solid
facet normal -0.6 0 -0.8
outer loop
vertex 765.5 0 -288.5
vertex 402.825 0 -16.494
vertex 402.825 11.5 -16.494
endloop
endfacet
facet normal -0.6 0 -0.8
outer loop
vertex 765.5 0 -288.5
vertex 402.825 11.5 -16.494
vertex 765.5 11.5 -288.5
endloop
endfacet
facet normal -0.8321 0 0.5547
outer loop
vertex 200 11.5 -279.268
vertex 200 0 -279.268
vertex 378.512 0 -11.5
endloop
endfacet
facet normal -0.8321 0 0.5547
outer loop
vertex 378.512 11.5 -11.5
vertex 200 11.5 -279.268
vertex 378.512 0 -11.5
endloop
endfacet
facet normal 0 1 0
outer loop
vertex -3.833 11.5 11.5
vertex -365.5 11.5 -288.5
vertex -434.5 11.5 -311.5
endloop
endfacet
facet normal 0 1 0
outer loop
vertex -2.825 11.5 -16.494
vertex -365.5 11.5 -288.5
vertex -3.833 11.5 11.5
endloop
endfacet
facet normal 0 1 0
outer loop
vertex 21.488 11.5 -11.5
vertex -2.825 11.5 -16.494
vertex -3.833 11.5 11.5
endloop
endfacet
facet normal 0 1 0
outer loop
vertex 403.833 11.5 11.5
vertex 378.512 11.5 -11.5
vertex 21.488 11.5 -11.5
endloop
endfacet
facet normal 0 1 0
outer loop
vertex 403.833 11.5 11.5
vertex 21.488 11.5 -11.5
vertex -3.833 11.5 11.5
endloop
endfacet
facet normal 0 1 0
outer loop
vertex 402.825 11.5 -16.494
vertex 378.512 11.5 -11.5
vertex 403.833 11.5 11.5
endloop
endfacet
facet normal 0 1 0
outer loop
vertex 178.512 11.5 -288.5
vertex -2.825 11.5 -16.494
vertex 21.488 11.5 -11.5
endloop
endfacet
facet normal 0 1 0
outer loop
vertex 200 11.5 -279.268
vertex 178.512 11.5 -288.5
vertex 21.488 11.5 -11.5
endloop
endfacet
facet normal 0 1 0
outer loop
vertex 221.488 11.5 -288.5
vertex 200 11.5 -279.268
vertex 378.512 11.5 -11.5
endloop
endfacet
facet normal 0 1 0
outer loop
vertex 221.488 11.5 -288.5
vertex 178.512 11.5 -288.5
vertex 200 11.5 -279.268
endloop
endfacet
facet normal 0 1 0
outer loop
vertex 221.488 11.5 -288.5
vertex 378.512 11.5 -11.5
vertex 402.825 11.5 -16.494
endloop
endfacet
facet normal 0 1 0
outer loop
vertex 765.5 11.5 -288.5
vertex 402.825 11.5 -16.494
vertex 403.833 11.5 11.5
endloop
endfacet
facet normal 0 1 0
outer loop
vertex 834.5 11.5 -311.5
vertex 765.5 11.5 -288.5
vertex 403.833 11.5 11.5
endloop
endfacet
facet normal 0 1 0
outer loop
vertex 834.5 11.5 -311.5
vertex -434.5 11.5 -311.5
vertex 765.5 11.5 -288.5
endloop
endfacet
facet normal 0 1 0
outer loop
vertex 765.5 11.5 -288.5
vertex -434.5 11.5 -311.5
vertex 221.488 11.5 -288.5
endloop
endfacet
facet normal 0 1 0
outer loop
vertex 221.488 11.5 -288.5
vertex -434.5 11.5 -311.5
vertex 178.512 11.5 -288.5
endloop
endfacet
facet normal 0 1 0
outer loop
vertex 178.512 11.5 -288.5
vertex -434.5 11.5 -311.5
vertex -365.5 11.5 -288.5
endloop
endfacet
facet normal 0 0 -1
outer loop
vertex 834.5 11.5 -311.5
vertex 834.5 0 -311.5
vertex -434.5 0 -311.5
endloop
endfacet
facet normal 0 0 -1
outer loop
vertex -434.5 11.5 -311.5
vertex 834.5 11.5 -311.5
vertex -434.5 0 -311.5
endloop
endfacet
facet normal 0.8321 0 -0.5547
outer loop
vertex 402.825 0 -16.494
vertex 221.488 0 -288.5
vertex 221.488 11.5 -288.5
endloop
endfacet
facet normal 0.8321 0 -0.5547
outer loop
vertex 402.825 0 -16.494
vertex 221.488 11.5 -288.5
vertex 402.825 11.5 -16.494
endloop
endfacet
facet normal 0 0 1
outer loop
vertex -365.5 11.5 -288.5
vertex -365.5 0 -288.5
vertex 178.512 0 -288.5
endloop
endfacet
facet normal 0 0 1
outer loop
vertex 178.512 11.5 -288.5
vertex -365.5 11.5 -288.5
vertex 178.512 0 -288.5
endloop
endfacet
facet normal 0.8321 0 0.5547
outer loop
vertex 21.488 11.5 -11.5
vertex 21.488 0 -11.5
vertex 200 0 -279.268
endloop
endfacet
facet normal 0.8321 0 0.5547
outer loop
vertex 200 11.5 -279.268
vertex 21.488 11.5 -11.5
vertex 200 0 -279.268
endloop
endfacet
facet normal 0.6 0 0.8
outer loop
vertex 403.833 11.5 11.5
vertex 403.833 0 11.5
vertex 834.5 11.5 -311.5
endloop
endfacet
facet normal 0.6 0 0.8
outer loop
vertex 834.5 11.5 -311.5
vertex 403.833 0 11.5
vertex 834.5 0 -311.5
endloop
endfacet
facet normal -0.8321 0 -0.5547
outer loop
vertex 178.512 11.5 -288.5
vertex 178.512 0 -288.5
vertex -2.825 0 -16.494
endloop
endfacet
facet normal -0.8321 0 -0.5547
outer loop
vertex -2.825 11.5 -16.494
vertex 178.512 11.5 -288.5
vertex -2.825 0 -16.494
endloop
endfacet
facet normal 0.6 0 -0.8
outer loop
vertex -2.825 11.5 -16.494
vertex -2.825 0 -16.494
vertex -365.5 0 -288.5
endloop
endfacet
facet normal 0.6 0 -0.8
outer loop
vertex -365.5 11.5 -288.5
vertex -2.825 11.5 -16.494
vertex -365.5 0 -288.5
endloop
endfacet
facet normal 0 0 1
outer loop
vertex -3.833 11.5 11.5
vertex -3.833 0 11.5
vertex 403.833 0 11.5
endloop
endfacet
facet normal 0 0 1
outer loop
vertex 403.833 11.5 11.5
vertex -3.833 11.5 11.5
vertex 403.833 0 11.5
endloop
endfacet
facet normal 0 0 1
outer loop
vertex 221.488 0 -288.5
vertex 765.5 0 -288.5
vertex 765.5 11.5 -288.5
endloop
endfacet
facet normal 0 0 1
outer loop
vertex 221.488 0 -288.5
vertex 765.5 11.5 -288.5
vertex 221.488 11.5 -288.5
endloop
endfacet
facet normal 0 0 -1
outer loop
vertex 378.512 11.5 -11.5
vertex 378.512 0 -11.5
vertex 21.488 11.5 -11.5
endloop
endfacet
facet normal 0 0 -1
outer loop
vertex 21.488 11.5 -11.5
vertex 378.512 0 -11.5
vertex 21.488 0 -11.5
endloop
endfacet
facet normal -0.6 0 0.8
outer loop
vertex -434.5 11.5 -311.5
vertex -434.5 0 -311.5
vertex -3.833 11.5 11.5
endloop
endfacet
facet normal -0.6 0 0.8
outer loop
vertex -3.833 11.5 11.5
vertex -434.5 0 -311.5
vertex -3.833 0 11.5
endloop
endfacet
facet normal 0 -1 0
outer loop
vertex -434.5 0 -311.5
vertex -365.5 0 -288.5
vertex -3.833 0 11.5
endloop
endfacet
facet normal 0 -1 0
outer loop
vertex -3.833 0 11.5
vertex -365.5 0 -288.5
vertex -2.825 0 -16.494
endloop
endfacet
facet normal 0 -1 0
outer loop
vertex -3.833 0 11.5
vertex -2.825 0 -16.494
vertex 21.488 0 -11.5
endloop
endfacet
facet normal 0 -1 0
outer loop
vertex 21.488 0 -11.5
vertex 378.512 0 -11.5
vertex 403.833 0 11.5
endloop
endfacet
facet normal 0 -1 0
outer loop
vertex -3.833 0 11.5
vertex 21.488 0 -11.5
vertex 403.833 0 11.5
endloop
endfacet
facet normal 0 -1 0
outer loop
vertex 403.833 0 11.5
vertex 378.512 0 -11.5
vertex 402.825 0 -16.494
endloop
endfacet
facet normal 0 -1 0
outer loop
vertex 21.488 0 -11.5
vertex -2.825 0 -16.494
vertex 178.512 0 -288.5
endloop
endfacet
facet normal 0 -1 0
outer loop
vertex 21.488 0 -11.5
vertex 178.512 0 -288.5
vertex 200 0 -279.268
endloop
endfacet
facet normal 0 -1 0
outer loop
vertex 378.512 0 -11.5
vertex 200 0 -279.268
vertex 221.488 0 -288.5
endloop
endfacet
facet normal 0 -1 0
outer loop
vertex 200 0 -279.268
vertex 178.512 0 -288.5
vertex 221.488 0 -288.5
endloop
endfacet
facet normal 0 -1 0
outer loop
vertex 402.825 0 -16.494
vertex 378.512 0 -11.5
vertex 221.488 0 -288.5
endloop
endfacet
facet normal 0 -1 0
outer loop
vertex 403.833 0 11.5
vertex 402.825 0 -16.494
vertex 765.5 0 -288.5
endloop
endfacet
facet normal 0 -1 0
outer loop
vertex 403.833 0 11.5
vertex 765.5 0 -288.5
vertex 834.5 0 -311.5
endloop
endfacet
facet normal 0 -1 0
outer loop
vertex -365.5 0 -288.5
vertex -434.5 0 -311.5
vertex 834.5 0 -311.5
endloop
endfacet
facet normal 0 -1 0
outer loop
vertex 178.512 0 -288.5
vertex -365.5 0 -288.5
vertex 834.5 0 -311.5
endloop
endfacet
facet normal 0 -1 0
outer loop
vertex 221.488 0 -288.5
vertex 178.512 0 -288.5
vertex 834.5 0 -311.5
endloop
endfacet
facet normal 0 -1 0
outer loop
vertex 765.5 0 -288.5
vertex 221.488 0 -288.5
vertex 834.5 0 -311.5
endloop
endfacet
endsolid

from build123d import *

# Parameters (mm, degrees)
BOSS_EXTRUDE2_DEPTH = 11.5
CUT_EXTRUDE3_REACH  = 892.817


with BuildPart() as part:
    # Sketch1 → Boss-Extrude2 (new body)
    with BuildSketch(Plane(origin=(0, 0, 0), x_dir=(1, 0, 0), z_dir=(0, 1, 0))):
        Polygon((-434.5, 311.5), (-3.833333333, -11.5), (403.833333333, -11.5), (834.5, 311.5), align=None)
    extrude(amount=BOSS_EXTRUDE2_DEPTH)

    # Sketch1<8> → Cut-Extrude3 (cut, up to next)
    with BuildSketch(Plane(origin=(0, 0, 0), x_dir=(1, 0, 0), z_dir=(0, 1, 0)), mode=Mode.PRIVATE) as cut_extrude3_sk1:
        Polygon((178.512053444, 288.5), (-365.5, 288.5), (-2.825297704, 16.493973278), align=None)
    cut_extrude3_tool1 = extrude(cut_extrude3_sk1.sketch, amount=CUT_EXTRUDE3_REACH, mode=Mode.PRIVATE) & part.part
    # Sketch1<8> → Cut-Extrude3 (cut, up to next)
    with BuildSketch(Plane(origin=(0, 0, 0), x_dir=(1, 0, 0), z_dir=(0, 1, 0)), mode=Mode.PRIVATE) as cut_extrude3_sk2:
        Polygon((200, 279.268080166), (21.487946556, 11.5), (378.512053444, 11.5), align=None)
    cut_extrude3_tool2 = extrude(cut_extrude3_sk2.sketch, amount=CUT_EXTRUDE3_REACH, mode=Mode.PRIVATE) & part.part
    # Sketch1<8> → Cut-Extrude3 (cut, up to next)
    with BuildSketch(Plane(origin=(0, 0, 0), x_dir=(1, 0, 0), z_dir=(0, 1, 0)), mode=Mode.PRIVATE) as cut_extrude3_sk3:
        Polygon((221.487946556, 288.5), (402.825297704, 16.493973278), (765.5, 288.5), align=None)
    cut_extrude3_tool3 = extrude(cut_extrude3_sk3.sketch, amount=CUT_EXTRUDE3_REACH, mode=Mode.PRIVATE) & part.part
    add(cut_extrude3_tool1.solids().sort_by_distance((-63.271081, 0, -197.831324))[0], mode=Mode.SUBTRACT)
    add(cut_extrude3_tool2.solids().sort_by_distance((200, 0, -100.756027))[0], mode=Mode.SUBTRACT)
    add(cut_extrude3_tool3.solids().sort_by_distance((463.271081, 0, -197.831324))[0], mode=Mode.SUBTRACT)


solid = part.part
